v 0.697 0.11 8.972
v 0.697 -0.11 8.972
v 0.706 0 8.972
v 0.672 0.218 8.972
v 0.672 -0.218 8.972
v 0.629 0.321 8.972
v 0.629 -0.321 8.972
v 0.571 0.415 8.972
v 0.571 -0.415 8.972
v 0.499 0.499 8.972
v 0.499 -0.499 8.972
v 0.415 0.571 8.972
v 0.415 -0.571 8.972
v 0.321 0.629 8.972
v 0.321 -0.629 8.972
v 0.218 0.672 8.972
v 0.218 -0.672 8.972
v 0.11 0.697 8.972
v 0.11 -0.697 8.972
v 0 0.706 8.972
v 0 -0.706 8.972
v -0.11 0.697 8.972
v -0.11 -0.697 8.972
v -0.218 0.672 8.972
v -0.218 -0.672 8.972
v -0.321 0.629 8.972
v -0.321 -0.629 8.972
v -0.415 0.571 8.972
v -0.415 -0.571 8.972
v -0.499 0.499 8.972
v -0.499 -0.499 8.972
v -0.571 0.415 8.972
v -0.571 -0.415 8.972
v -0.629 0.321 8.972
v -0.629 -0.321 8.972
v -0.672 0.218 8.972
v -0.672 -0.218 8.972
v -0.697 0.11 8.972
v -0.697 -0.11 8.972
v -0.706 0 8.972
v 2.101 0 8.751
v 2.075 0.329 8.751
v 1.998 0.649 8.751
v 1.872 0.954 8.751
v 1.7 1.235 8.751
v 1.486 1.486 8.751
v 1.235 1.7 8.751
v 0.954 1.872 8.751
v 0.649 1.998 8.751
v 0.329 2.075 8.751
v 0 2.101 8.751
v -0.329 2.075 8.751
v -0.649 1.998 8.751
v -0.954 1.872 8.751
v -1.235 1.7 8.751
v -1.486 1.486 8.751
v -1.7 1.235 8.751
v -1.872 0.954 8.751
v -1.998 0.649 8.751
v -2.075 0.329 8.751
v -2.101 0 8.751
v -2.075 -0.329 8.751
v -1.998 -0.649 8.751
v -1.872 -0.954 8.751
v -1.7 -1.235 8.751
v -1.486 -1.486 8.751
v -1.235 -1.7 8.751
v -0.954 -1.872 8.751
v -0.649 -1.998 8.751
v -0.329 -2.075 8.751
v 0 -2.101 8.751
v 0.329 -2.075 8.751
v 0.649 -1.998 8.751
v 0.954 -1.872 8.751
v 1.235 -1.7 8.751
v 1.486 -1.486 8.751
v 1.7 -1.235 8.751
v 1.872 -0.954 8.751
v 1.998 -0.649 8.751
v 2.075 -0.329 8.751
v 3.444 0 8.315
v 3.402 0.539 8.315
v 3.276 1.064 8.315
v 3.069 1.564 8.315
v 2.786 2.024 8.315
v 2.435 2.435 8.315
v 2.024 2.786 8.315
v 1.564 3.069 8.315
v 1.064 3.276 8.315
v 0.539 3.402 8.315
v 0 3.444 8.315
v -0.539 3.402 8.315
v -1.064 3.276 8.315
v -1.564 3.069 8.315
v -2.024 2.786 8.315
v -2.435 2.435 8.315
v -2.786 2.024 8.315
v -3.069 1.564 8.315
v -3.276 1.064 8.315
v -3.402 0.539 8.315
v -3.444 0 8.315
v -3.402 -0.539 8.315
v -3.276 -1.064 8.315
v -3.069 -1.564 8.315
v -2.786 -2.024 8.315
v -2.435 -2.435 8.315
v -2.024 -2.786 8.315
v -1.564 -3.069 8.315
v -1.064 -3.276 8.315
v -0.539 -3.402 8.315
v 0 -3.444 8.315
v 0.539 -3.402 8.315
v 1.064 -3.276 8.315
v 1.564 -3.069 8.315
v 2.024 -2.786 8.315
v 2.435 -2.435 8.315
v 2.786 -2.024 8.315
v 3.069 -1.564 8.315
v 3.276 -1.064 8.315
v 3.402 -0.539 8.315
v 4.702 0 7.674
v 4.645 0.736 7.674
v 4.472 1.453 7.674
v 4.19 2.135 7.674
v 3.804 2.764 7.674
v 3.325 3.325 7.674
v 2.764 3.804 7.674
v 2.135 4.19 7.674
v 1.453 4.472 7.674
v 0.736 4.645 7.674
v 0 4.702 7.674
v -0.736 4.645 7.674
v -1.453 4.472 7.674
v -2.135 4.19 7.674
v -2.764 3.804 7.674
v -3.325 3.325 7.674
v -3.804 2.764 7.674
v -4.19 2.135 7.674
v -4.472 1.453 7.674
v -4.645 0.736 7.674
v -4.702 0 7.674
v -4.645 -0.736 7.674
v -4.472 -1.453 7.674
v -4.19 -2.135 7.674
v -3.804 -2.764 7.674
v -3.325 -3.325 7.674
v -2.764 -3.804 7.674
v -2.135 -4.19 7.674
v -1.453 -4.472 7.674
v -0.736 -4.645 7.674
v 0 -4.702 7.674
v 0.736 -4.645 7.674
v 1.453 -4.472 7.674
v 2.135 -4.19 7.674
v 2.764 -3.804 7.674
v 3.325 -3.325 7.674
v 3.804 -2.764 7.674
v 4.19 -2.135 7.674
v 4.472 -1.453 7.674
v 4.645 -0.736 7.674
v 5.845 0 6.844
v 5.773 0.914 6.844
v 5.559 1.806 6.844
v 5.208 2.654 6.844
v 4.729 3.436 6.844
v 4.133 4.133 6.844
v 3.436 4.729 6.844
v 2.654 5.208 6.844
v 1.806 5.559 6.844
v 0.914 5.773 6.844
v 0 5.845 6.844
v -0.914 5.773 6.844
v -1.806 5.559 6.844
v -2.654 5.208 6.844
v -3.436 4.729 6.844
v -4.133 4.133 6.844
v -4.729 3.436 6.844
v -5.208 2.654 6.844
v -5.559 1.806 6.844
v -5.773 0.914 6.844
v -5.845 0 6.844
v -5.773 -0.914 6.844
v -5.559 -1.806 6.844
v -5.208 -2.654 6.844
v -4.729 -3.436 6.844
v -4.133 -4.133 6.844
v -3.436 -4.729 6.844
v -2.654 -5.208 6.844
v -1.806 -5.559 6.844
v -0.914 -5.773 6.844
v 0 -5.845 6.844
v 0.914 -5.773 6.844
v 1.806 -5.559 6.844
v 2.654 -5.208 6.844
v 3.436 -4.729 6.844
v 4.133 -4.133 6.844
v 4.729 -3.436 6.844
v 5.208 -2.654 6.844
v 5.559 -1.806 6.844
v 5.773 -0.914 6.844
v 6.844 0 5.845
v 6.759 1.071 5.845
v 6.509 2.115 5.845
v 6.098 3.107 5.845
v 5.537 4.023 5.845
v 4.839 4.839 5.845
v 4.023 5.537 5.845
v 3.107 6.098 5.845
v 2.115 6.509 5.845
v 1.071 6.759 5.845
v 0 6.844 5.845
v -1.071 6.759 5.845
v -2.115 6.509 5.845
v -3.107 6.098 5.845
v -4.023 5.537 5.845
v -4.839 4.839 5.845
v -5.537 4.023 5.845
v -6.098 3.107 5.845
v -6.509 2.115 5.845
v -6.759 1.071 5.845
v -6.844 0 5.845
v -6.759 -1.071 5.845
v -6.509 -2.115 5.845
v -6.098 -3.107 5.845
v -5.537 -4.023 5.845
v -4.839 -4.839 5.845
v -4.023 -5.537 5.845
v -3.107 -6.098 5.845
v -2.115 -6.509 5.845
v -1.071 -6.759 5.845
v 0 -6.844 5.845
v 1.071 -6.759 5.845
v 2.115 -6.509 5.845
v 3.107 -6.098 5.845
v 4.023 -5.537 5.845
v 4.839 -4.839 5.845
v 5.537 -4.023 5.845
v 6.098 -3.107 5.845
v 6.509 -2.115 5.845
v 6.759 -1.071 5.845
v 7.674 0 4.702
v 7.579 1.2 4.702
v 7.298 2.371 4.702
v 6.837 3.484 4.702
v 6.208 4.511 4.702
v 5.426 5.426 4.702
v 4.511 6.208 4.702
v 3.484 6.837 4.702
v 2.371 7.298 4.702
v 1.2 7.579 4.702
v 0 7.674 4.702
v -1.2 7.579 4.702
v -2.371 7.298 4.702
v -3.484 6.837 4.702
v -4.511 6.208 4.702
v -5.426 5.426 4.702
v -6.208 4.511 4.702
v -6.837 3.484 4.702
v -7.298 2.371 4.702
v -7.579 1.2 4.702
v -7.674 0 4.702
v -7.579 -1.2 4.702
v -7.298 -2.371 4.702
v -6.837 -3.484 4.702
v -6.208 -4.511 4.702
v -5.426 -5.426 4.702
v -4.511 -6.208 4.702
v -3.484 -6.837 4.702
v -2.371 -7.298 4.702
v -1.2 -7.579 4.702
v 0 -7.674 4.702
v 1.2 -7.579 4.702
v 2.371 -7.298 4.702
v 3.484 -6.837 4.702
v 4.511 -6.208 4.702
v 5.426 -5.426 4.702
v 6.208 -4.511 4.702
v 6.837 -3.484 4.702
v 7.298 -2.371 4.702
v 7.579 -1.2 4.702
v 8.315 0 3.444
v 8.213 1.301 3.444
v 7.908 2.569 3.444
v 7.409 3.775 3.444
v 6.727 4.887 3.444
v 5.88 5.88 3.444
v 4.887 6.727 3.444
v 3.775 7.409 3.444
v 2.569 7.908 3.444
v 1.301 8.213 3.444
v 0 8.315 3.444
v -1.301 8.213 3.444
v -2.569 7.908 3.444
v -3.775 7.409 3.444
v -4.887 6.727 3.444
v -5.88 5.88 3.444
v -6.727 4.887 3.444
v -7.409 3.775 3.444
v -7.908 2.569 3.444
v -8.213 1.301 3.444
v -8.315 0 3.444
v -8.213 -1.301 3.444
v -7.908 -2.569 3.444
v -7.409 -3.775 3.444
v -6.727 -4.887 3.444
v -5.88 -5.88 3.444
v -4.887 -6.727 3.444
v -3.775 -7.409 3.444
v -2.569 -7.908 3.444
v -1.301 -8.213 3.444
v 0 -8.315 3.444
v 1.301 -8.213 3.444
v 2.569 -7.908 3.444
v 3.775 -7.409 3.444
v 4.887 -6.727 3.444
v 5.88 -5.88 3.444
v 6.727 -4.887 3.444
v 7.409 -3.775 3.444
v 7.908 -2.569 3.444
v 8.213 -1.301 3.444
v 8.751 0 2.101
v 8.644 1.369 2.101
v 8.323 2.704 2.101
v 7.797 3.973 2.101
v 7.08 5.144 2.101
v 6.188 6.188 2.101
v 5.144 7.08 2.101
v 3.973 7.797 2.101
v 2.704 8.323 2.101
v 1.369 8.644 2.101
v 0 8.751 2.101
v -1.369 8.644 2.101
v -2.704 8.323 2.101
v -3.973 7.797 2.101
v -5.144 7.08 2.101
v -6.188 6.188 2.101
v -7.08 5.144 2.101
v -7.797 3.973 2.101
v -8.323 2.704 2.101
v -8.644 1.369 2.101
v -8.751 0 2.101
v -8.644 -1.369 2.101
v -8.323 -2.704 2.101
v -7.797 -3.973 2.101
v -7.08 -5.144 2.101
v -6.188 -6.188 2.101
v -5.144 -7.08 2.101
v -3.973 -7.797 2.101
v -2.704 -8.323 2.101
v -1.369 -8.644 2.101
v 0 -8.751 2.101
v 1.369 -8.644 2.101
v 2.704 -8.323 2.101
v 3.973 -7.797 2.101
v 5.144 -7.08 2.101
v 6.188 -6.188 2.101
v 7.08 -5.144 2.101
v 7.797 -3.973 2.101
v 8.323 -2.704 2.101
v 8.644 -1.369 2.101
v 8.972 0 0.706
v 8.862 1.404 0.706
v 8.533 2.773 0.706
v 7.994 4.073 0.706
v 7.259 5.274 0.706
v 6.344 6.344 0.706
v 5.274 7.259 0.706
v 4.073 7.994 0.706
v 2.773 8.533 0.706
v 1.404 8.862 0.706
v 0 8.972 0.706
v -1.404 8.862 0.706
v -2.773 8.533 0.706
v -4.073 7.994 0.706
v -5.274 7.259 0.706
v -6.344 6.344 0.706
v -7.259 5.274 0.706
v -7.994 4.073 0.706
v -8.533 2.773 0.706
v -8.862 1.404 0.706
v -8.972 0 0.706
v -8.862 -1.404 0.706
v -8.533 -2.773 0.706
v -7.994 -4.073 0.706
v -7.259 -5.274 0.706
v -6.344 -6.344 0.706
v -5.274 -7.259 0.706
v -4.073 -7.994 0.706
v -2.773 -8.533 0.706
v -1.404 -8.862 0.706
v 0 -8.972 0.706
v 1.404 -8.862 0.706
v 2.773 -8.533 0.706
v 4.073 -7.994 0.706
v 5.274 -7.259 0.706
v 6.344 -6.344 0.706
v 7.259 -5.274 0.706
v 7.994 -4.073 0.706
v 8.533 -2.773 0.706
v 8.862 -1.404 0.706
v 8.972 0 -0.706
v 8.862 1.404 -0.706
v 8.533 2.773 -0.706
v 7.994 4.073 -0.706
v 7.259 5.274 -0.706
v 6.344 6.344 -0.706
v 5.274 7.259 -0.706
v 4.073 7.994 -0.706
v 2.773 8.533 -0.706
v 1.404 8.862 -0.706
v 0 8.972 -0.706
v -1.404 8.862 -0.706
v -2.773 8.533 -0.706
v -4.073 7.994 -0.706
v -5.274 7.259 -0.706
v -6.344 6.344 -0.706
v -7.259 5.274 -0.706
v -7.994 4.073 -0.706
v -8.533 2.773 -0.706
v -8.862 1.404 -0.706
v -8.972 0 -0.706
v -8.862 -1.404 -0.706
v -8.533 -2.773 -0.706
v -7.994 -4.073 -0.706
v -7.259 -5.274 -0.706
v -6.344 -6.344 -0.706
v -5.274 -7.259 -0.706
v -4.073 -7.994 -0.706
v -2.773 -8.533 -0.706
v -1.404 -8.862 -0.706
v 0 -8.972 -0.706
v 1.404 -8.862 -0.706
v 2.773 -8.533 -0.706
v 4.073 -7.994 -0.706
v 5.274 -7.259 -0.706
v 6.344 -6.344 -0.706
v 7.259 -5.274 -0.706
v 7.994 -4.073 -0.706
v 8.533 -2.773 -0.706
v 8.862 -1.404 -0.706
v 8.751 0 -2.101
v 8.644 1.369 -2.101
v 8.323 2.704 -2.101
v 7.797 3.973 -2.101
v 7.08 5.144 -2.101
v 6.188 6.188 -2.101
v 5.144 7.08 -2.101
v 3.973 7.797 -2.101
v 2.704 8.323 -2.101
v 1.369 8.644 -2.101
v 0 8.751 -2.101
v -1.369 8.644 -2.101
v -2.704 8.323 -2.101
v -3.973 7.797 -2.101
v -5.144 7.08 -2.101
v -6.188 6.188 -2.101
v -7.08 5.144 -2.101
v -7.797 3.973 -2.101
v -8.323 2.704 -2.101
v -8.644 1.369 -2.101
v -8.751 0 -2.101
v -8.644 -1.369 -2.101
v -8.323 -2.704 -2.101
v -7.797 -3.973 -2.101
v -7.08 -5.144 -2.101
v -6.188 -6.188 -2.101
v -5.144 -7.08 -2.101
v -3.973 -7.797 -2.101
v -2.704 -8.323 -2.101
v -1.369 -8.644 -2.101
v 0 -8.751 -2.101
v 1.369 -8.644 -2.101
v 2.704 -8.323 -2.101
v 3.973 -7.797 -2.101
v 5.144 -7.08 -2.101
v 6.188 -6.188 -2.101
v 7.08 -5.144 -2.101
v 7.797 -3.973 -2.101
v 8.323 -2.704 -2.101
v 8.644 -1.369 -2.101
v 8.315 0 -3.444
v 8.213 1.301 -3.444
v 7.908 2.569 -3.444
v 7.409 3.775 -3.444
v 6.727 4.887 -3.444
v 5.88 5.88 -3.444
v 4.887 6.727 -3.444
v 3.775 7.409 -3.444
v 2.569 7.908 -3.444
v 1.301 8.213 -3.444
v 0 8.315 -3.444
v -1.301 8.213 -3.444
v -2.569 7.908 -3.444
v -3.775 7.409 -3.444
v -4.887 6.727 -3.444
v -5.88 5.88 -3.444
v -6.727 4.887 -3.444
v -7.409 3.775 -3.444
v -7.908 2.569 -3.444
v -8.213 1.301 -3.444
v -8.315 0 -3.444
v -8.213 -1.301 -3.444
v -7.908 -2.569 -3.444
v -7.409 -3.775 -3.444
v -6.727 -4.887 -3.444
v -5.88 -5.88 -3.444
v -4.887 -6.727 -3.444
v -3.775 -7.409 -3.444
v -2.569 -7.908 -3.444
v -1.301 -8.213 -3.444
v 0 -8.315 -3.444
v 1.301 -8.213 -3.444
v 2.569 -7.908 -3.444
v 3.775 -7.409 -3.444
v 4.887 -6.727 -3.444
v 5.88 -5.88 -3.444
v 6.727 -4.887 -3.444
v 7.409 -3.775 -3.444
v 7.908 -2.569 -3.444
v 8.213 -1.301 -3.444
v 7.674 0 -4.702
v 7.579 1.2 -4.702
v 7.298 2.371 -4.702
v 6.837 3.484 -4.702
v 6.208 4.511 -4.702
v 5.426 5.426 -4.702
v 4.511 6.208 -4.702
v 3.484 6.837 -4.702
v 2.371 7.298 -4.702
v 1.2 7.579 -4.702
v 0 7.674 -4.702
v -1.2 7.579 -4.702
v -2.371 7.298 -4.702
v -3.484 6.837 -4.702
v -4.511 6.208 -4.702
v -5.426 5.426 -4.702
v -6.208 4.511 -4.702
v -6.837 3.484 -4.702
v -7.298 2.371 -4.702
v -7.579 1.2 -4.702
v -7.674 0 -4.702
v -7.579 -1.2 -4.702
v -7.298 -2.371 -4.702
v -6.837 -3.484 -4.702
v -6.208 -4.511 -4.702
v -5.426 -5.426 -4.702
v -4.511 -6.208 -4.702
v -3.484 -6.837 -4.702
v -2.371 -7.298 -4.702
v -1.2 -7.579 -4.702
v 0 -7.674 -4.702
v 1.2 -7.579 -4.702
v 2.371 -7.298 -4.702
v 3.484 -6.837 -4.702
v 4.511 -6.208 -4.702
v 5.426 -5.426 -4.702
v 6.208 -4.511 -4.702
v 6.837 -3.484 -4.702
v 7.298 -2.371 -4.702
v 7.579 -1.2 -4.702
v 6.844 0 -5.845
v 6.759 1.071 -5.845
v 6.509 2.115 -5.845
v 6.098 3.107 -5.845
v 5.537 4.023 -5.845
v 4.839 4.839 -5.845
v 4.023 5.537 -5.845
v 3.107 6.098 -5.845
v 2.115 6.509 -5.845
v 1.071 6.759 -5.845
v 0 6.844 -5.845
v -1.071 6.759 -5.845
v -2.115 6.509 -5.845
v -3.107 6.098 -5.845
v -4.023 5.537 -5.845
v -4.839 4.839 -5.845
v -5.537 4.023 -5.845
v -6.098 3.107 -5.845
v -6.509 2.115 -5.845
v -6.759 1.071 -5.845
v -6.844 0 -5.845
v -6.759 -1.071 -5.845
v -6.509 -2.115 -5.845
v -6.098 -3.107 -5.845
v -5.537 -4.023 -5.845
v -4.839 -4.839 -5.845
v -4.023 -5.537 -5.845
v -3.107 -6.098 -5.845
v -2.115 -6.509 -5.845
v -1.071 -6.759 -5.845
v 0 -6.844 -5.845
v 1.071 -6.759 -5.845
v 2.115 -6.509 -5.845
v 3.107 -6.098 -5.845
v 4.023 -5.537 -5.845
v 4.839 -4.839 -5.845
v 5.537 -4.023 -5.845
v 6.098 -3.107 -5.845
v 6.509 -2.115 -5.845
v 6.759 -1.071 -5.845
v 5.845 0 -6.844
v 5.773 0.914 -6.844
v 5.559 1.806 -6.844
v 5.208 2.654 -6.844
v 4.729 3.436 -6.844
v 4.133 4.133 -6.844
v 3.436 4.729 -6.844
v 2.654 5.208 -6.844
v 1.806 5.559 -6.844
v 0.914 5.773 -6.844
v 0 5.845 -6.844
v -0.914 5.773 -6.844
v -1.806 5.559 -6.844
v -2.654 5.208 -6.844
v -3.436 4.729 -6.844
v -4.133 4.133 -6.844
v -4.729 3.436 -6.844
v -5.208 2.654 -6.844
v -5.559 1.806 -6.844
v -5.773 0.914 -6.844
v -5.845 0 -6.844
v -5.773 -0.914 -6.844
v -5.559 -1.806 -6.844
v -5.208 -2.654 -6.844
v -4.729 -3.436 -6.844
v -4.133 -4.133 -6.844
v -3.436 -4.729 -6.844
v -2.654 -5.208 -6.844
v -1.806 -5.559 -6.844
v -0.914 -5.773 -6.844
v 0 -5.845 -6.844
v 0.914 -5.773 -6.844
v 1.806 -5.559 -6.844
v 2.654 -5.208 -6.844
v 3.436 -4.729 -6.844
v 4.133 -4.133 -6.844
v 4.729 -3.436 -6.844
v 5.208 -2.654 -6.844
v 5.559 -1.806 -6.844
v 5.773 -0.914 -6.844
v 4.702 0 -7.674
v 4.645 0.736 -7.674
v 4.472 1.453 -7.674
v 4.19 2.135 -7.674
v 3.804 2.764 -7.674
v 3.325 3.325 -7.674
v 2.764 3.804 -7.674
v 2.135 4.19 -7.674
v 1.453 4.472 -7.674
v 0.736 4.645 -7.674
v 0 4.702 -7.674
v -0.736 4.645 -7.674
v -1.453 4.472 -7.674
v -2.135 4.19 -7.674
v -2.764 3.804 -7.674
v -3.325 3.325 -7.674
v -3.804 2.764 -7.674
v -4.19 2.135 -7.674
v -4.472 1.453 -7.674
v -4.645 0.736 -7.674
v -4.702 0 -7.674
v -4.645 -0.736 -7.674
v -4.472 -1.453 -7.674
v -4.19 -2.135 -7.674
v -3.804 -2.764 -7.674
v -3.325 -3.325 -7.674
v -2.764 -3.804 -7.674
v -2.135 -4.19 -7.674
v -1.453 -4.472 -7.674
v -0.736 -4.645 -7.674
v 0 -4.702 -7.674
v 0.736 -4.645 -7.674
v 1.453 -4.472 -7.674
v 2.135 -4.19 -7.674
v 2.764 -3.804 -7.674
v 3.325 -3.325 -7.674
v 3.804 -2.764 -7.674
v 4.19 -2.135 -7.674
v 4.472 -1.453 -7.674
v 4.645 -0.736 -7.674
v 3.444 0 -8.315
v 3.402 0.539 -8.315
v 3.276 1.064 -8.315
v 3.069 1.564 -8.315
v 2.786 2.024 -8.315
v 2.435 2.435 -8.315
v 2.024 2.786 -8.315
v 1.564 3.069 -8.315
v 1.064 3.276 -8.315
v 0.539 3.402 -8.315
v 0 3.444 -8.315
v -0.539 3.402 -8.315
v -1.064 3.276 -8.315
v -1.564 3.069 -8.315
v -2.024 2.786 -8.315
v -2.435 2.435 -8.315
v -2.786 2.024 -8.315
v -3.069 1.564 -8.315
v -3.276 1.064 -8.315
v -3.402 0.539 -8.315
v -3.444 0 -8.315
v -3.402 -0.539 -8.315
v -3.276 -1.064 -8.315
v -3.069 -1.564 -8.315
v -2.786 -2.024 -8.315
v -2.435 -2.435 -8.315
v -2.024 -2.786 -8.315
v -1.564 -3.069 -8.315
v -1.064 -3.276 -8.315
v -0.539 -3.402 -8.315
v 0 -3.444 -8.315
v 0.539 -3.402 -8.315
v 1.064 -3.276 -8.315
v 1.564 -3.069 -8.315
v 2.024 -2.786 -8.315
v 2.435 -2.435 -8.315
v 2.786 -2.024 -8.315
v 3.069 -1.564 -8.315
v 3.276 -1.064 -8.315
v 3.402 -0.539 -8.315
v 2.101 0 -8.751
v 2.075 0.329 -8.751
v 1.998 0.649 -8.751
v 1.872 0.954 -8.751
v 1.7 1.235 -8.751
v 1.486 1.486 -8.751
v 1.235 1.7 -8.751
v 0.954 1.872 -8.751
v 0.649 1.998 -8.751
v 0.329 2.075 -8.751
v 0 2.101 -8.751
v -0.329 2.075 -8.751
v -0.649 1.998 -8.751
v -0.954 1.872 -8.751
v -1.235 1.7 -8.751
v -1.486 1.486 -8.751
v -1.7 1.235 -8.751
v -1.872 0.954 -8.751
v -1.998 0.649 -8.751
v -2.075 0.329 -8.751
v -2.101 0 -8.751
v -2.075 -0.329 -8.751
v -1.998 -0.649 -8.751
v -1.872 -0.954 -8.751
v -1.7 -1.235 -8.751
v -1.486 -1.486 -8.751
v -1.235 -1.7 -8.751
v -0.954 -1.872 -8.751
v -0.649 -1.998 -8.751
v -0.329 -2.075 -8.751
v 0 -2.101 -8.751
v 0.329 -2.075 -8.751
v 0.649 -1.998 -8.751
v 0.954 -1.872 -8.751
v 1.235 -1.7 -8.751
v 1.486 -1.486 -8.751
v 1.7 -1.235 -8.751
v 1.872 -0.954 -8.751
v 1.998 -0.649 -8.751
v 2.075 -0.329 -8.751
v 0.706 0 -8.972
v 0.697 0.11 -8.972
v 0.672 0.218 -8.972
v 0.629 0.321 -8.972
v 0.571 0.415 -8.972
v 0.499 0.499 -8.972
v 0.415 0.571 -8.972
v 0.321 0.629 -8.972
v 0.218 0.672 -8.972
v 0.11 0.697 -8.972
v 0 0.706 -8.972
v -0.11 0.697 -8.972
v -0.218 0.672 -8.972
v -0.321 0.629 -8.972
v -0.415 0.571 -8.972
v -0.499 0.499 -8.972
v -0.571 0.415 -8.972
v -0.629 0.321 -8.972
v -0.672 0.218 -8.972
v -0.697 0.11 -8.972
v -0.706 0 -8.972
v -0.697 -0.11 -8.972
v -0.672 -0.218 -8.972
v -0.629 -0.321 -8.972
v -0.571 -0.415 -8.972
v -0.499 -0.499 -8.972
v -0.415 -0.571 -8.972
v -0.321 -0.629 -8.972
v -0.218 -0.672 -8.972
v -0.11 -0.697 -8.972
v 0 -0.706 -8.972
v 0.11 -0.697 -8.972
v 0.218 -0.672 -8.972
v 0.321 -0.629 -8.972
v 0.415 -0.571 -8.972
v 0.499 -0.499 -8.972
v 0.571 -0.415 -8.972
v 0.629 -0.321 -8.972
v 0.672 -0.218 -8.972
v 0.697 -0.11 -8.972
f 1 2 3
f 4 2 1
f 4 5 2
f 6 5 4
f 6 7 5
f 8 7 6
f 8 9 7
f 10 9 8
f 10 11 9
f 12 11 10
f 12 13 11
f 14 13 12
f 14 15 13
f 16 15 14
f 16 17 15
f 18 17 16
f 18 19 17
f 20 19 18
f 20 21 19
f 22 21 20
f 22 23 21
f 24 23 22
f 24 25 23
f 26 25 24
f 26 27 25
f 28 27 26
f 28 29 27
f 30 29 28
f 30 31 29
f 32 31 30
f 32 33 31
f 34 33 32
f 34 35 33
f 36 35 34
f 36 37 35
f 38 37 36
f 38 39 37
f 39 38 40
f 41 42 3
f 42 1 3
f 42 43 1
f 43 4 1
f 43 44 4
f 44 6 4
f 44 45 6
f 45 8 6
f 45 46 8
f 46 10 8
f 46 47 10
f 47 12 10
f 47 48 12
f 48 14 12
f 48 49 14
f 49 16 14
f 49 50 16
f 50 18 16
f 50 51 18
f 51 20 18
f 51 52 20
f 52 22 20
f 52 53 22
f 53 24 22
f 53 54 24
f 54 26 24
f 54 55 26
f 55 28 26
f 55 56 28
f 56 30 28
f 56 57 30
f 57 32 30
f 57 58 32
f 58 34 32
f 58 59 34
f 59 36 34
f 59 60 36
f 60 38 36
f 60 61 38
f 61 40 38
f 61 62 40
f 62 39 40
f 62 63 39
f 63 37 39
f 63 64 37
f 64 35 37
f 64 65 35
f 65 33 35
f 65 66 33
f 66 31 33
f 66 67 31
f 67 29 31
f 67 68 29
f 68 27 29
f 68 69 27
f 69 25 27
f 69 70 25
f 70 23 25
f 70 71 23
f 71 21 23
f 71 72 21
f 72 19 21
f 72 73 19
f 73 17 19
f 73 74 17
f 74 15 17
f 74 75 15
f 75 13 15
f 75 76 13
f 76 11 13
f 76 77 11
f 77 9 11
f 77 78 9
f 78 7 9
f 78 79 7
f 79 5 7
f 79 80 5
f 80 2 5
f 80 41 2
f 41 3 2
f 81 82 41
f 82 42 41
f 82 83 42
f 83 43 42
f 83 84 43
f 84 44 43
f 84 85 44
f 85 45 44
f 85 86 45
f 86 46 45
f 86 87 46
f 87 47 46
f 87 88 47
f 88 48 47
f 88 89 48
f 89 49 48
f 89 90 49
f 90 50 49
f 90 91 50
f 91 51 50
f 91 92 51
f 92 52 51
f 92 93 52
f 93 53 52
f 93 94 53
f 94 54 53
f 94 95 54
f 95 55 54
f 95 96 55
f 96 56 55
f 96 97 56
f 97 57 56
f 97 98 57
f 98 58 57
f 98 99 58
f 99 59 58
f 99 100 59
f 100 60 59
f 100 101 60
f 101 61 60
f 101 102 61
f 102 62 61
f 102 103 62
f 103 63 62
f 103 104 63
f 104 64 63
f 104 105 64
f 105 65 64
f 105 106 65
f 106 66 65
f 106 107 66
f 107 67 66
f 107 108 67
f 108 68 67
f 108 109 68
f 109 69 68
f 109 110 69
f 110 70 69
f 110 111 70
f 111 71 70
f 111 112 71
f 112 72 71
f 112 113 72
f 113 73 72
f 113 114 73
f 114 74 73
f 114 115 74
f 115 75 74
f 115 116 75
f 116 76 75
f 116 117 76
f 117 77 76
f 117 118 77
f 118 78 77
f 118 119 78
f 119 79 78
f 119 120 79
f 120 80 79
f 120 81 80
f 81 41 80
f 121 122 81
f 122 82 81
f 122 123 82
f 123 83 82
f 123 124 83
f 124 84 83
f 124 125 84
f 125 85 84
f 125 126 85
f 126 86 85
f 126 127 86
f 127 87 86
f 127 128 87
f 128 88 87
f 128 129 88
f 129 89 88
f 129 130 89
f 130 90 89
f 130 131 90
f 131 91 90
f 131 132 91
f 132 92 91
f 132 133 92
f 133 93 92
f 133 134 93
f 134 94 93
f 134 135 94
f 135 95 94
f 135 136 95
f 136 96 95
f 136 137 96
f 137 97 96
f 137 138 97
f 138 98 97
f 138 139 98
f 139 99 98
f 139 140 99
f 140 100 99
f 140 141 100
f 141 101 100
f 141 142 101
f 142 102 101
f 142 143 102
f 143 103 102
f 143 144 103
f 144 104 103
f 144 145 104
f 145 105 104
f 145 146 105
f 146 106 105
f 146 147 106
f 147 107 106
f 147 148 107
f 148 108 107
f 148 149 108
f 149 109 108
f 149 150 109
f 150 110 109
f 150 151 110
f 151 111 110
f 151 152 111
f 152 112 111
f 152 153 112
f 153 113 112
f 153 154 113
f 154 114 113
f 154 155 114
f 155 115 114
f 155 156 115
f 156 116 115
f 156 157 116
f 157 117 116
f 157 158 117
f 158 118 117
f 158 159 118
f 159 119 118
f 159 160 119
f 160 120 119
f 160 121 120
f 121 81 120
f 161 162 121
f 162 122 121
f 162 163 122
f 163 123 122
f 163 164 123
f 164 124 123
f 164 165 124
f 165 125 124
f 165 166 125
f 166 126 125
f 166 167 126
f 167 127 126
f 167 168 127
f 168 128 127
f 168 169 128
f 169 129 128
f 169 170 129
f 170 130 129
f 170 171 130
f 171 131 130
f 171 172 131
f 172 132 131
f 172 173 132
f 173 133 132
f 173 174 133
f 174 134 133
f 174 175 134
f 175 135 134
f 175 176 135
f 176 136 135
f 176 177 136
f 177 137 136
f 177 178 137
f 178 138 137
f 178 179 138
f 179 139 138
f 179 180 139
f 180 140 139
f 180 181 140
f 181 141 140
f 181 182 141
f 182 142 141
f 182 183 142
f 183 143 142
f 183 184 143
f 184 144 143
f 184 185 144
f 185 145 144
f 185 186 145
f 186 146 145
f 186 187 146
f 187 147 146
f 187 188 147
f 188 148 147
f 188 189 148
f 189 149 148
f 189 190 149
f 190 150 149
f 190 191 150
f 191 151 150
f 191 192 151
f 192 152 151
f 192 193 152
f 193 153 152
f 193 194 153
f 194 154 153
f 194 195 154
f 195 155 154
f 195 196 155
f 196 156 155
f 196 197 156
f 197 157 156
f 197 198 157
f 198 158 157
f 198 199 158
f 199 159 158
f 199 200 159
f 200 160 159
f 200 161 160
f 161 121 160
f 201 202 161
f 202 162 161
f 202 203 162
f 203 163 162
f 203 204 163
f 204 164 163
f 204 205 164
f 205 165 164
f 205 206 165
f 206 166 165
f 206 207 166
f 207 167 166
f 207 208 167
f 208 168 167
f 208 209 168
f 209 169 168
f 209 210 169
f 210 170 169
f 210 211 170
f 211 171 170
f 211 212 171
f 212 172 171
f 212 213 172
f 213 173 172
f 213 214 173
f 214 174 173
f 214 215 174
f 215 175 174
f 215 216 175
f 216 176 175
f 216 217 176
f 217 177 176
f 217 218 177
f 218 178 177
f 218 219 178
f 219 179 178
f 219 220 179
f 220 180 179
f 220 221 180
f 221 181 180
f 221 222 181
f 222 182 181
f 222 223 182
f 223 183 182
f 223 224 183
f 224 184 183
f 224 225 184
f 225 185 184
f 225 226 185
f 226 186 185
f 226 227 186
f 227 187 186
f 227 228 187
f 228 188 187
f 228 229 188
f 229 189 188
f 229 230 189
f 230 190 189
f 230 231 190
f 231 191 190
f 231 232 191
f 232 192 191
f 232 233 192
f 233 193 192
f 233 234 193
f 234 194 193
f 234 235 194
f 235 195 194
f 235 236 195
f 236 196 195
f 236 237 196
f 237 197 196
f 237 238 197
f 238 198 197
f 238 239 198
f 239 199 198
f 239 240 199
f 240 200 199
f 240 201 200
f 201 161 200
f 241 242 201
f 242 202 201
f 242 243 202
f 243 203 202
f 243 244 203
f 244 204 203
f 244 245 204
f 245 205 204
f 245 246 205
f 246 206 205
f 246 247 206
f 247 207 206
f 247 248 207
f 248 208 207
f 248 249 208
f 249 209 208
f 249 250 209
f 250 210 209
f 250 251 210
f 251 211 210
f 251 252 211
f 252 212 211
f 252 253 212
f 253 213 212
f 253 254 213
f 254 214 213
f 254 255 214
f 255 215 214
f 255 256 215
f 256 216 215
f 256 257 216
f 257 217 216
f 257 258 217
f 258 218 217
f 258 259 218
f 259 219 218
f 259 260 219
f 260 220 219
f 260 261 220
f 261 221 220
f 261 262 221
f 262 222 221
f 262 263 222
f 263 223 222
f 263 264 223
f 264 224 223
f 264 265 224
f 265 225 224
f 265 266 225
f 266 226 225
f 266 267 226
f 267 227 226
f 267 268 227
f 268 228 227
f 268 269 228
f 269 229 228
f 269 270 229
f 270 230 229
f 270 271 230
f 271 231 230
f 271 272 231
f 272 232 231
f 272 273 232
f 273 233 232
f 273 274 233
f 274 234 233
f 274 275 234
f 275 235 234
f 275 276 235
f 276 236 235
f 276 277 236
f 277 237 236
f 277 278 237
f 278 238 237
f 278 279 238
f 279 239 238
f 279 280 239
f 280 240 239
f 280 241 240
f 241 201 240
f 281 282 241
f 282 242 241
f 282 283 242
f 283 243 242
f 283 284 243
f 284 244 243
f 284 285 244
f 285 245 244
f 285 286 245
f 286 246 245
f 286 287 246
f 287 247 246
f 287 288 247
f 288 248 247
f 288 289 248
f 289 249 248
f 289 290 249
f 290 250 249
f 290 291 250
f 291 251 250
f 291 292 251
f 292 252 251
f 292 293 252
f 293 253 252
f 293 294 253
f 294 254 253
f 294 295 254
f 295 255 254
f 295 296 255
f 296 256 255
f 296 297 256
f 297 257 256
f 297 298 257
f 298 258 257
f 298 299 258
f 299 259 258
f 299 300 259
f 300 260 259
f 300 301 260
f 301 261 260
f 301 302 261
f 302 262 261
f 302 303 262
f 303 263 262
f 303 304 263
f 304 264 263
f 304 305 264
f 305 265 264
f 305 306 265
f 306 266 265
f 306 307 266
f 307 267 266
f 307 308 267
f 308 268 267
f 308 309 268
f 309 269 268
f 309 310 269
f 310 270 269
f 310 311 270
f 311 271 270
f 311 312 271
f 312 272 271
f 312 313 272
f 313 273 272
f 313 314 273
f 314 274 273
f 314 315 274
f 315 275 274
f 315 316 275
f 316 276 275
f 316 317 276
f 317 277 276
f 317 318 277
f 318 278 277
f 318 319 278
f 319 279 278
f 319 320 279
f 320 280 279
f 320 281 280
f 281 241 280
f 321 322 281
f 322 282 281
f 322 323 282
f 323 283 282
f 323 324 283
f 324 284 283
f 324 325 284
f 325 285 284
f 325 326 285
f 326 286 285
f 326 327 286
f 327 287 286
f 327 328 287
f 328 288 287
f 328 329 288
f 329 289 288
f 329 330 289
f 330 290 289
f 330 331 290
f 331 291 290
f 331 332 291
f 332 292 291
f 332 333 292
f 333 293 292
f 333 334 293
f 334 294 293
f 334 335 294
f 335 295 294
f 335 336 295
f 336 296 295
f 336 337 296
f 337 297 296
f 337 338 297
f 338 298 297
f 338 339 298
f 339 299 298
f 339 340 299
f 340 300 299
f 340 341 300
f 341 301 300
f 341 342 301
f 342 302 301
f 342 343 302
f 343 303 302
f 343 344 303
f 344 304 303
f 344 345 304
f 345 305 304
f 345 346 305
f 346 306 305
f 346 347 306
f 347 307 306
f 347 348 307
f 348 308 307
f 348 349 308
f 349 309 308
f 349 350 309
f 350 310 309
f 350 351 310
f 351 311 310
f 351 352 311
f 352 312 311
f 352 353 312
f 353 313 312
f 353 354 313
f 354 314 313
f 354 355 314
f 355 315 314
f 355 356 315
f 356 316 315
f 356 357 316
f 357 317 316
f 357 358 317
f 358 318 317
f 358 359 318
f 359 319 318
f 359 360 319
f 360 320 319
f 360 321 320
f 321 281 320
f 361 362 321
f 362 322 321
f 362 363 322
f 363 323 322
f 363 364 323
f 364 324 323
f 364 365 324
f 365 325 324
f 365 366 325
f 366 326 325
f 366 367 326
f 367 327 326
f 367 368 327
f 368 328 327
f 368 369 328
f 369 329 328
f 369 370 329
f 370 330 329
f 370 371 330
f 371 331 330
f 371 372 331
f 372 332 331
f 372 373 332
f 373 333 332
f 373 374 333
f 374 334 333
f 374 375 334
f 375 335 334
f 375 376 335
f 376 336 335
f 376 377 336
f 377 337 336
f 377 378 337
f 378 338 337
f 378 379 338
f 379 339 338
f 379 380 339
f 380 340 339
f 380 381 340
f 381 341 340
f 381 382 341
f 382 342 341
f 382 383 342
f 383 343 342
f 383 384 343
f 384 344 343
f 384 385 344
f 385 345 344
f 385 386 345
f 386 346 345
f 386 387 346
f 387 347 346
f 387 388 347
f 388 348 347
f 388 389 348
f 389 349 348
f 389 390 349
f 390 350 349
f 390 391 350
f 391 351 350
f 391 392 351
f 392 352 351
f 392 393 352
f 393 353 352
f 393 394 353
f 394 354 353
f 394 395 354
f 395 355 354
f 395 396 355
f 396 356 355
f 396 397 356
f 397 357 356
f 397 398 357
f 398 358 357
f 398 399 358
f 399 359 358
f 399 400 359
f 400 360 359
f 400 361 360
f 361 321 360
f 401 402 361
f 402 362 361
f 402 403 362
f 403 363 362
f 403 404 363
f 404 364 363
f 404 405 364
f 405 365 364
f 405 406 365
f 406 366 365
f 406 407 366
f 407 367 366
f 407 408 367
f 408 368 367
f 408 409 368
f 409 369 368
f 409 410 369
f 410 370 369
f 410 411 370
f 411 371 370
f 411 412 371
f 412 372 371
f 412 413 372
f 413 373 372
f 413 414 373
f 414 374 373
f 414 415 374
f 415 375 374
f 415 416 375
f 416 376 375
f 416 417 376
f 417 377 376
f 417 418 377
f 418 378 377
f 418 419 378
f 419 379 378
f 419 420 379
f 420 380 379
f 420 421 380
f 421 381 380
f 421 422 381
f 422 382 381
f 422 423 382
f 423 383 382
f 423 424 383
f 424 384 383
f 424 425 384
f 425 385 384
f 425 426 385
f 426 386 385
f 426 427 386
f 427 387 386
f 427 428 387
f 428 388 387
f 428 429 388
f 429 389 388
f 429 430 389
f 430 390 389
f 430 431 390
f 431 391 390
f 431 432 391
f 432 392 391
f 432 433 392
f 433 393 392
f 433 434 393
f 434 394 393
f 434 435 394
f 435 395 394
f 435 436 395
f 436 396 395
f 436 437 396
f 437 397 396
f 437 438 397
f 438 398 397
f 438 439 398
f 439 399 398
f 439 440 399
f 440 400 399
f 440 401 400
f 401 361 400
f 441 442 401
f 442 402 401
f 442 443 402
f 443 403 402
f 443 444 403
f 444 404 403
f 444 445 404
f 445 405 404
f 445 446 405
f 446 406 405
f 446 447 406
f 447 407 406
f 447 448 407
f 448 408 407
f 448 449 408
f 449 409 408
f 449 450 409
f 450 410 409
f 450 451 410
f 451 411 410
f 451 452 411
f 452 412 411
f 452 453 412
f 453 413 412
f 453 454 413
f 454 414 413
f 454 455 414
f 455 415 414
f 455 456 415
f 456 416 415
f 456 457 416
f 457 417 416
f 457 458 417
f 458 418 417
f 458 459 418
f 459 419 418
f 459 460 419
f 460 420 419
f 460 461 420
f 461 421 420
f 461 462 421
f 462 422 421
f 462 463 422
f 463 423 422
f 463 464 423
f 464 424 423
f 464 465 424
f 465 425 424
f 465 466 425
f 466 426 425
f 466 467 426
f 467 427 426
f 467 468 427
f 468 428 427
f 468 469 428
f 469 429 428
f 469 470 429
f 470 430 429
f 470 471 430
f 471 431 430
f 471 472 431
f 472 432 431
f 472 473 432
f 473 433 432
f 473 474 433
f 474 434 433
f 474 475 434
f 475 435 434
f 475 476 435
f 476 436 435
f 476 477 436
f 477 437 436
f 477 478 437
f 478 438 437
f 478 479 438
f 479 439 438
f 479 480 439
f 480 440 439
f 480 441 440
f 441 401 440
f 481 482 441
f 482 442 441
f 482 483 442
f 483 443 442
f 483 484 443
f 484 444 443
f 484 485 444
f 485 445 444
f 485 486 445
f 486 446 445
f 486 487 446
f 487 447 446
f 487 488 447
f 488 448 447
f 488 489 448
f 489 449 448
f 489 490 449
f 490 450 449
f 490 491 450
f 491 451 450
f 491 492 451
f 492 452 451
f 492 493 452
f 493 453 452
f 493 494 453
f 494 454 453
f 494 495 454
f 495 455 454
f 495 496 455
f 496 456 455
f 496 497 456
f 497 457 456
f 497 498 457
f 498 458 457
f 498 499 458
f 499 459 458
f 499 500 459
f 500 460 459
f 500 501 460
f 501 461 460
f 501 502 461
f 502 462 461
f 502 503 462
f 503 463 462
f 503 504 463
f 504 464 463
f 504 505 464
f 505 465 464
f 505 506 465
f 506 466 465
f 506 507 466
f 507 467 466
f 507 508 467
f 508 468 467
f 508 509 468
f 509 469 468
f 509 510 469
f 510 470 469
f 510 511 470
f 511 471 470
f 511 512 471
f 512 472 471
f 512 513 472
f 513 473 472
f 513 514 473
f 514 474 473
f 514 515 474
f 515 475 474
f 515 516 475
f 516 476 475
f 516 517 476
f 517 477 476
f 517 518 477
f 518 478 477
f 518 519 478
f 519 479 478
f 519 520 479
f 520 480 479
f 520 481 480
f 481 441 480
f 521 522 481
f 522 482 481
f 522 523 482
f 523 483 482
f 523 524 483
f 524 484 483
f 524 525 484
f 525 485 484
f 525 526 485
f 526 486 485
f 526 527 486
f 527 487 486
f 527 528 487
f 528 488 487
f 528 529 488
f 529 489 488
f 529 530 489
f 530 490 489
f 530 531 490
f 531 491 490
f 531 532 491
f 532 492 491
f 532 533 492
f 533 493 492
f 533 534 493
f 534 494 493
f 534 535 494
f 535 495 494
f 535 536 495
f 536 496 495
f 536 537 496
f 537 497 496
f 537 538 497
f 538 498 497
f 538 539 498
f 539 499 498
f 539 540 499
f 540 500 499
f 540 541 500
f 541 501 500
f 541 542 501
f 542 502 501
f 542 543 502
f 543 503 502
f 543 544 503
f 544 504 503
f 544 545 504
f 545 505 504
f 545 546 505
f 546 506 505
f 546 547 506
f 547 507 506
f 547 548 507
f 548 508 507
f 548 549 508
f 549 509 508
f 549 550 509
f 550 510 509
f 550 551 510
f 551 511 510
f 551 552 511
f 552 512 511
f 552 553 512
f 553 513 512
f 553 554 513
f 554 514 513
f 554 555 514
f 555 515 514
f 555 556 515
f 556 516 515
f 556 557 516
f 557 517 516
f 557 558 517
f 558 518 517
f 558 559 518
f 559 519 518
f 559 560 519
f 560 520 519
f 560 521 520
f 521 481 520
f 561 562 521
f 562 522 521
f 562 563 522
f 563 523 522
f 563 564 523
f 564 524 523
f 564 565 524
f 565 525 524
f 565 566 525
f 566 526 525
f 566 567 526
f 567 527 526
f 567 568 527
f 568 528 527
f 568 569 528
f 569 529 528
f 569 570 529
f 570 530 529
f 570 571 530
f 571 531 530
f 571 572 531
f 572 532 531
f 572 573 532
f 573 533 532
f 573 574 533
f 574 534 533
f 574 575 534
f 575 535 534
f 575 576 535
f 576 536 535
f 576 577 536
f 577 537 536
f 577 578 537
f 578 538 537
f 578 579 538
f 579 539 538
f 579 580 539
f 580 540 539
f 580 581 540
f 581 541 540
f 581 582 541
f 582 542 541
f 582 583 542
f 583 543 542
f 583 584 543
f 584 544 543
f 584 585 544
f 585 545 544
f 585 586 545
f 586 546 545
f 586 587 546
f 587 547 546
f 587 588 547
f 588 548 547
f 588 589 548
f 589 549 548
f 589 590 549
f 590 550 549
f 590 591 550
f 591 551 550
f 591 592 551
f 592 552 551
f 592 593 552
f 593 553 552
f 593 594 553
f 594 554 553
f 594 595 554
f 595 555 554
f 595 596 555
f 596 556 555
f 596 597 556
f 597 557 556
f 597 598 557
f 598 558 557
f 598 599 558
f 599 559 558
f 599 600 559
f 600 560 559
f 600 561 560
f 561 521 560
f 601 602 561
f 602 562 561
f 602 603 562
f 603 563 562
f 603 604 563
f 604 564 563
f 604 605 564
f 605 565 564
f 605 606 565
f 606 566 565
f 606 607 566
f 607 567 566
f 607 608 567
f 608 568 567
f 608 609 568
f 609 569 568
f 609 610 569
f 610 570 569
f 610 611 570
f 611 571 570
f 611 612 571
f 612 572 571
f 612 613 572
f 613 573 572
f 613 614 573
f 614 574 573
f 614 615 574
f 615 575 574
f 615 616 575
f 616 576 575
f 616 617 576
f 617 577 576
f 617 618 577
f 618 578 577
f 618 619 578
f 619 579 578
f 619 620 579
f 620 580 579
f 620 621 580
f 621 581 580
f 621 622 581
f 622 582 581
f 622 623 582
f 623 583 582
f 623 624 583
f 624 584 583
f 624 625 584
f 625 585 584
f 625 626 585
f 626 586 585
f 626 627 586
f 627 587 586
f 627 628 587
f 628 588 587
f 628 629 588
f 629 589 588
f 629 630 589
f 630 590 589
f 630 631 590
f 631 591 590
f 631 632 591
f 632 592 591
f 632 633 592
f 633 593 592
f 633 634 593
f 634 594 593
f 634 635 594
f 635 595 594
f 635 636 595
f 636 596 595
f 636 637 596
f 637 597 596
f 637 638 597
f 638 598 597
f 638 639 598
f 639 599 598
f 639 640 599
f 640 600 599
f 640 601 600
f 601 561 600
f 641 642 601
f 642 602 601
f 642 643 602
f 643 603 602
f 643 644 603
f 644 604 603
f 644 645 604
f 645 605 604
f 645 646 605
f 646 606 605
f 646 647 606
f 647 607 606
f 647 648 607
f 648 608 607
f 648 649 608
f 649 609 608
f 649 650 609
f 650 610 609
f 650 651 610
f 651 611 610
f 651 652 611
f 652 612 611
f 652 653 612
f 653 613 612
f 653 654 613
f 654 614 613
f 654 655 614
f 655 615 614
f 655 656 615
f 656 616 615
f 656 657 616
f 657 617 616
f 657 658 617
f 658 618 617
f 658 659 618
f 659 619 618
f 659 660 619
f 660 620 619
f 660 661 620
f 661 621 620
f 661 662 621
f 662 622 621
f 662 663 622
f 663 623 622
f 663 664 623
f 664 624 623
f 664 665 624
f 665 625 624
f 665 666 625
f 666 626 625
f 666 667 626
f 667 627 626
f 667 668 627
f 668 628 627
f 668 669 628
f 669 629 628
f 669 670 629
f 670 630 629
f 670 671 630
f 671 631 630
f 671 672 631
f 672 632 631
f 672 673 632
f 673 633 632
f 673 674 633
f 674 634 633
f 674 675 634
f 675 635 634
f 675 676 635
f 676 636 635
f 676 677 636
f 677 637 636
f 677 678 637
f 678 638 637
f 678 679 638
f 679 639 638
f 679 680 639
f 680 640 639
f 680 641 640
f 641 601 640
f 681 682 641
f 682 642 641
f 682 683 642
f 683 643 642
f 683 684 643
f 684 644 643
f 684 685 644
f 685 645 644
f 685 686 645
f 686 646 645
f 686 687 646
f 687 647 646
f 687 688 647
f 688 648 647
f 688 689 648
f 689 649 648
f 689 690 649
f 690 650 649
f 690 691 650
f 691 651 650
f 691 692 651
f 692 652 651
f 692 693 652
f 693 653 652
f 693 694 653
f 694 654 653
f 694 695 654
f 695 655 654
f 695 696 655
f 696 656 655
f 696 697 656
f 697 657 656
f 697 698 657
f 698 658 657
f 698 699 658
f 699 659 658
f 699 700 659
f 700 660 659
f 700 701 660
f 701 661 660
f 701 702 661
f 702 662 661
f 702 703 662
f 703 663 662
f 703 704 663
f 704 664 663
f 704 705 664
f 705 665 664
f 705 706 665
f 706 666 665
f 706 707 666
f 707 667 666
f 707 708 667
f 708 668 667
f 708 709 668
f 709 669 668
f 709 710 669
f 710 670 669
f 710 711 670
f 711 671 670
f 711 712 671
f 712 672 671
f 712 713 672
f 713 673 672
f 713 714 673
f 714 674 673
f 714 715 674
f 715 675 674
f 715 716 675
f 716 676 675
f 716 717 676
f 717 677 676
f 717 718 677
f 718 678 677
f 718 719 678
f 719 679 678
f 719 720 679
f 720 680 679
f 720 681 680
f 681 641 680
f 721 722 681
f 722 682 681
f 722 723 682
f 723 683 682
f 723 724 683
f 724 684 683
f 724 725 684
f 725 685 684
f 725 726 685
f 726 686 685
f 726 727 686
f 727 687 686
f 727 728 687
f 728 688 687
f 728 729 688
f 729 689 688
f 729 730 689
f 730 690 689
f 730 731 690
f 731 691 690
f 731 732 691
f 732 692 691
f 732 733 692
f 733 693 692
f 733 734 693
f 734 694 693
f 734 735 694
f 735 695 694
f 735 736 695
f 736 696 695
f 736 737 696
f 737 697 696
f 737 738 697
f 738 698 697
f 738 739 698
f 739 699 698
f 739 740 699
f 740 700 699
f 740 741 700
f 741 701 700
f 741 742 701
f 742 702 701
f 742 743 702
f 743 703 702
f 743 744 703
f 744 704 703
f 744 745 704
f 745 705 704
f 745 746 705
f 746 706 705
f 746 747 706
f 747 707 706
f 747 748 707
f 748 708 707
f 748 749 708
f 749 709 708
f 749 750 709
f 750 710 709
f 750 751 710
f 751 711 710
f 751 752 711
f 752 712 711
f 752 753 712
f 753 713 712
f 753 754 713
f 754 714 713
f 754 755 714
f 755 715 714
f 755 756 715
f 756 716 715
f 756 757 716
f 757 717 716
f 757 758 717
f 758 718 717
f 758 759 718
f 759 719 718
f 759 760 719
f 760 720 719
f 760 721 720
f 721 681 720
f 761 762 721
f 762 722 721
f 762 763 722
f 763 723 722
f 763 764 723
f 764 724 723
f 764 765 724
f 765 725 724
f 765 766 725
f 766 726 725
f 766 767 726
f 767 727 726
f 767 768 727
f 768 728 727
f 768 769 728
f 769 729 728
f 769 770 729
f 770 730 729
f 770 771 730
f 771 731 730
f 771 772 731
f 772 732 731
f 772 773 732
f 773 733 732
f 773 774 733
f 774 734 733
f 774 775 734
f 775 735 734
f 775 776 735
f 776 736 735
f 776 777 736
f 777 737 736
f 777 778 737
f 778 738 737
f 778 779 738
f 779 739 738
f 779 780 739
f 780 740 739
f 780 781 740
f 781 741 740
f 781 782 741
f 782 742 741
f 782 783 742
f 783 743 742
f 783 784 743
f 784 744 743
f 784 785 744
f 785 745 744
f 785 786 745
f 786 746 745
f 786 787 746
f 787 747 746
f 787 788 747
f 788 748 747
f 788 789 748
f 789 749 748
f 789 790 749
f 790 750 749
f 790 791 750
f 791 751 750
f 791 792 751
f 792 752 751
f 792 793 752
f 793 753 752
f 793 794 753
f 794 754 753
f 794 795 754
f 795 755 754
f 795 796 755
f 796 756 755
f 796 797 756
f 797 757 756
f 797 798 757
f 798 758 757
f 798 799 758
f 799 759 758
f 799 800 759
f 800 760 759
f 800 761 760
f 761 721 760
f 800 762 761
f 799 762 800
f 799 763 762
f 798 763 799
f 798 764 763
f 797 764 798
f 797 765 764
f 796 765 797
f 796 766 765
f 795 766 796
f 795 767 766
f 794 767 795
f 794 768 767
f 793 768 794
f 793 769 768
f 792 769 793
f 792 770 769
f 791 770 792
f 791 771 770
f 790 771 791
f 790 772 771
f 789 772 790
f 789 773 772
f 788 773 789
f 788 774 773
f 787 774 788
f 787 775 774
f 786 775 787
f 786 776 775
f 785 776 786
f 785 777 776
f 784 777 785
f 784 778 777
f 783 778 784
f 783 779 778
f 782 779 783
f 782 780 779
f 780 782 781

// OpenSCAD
// Construct: ternary ?: selecting a radius.
big = true;
r = big ? 9 : 3;
sphere(r = r, $fn = 40);
